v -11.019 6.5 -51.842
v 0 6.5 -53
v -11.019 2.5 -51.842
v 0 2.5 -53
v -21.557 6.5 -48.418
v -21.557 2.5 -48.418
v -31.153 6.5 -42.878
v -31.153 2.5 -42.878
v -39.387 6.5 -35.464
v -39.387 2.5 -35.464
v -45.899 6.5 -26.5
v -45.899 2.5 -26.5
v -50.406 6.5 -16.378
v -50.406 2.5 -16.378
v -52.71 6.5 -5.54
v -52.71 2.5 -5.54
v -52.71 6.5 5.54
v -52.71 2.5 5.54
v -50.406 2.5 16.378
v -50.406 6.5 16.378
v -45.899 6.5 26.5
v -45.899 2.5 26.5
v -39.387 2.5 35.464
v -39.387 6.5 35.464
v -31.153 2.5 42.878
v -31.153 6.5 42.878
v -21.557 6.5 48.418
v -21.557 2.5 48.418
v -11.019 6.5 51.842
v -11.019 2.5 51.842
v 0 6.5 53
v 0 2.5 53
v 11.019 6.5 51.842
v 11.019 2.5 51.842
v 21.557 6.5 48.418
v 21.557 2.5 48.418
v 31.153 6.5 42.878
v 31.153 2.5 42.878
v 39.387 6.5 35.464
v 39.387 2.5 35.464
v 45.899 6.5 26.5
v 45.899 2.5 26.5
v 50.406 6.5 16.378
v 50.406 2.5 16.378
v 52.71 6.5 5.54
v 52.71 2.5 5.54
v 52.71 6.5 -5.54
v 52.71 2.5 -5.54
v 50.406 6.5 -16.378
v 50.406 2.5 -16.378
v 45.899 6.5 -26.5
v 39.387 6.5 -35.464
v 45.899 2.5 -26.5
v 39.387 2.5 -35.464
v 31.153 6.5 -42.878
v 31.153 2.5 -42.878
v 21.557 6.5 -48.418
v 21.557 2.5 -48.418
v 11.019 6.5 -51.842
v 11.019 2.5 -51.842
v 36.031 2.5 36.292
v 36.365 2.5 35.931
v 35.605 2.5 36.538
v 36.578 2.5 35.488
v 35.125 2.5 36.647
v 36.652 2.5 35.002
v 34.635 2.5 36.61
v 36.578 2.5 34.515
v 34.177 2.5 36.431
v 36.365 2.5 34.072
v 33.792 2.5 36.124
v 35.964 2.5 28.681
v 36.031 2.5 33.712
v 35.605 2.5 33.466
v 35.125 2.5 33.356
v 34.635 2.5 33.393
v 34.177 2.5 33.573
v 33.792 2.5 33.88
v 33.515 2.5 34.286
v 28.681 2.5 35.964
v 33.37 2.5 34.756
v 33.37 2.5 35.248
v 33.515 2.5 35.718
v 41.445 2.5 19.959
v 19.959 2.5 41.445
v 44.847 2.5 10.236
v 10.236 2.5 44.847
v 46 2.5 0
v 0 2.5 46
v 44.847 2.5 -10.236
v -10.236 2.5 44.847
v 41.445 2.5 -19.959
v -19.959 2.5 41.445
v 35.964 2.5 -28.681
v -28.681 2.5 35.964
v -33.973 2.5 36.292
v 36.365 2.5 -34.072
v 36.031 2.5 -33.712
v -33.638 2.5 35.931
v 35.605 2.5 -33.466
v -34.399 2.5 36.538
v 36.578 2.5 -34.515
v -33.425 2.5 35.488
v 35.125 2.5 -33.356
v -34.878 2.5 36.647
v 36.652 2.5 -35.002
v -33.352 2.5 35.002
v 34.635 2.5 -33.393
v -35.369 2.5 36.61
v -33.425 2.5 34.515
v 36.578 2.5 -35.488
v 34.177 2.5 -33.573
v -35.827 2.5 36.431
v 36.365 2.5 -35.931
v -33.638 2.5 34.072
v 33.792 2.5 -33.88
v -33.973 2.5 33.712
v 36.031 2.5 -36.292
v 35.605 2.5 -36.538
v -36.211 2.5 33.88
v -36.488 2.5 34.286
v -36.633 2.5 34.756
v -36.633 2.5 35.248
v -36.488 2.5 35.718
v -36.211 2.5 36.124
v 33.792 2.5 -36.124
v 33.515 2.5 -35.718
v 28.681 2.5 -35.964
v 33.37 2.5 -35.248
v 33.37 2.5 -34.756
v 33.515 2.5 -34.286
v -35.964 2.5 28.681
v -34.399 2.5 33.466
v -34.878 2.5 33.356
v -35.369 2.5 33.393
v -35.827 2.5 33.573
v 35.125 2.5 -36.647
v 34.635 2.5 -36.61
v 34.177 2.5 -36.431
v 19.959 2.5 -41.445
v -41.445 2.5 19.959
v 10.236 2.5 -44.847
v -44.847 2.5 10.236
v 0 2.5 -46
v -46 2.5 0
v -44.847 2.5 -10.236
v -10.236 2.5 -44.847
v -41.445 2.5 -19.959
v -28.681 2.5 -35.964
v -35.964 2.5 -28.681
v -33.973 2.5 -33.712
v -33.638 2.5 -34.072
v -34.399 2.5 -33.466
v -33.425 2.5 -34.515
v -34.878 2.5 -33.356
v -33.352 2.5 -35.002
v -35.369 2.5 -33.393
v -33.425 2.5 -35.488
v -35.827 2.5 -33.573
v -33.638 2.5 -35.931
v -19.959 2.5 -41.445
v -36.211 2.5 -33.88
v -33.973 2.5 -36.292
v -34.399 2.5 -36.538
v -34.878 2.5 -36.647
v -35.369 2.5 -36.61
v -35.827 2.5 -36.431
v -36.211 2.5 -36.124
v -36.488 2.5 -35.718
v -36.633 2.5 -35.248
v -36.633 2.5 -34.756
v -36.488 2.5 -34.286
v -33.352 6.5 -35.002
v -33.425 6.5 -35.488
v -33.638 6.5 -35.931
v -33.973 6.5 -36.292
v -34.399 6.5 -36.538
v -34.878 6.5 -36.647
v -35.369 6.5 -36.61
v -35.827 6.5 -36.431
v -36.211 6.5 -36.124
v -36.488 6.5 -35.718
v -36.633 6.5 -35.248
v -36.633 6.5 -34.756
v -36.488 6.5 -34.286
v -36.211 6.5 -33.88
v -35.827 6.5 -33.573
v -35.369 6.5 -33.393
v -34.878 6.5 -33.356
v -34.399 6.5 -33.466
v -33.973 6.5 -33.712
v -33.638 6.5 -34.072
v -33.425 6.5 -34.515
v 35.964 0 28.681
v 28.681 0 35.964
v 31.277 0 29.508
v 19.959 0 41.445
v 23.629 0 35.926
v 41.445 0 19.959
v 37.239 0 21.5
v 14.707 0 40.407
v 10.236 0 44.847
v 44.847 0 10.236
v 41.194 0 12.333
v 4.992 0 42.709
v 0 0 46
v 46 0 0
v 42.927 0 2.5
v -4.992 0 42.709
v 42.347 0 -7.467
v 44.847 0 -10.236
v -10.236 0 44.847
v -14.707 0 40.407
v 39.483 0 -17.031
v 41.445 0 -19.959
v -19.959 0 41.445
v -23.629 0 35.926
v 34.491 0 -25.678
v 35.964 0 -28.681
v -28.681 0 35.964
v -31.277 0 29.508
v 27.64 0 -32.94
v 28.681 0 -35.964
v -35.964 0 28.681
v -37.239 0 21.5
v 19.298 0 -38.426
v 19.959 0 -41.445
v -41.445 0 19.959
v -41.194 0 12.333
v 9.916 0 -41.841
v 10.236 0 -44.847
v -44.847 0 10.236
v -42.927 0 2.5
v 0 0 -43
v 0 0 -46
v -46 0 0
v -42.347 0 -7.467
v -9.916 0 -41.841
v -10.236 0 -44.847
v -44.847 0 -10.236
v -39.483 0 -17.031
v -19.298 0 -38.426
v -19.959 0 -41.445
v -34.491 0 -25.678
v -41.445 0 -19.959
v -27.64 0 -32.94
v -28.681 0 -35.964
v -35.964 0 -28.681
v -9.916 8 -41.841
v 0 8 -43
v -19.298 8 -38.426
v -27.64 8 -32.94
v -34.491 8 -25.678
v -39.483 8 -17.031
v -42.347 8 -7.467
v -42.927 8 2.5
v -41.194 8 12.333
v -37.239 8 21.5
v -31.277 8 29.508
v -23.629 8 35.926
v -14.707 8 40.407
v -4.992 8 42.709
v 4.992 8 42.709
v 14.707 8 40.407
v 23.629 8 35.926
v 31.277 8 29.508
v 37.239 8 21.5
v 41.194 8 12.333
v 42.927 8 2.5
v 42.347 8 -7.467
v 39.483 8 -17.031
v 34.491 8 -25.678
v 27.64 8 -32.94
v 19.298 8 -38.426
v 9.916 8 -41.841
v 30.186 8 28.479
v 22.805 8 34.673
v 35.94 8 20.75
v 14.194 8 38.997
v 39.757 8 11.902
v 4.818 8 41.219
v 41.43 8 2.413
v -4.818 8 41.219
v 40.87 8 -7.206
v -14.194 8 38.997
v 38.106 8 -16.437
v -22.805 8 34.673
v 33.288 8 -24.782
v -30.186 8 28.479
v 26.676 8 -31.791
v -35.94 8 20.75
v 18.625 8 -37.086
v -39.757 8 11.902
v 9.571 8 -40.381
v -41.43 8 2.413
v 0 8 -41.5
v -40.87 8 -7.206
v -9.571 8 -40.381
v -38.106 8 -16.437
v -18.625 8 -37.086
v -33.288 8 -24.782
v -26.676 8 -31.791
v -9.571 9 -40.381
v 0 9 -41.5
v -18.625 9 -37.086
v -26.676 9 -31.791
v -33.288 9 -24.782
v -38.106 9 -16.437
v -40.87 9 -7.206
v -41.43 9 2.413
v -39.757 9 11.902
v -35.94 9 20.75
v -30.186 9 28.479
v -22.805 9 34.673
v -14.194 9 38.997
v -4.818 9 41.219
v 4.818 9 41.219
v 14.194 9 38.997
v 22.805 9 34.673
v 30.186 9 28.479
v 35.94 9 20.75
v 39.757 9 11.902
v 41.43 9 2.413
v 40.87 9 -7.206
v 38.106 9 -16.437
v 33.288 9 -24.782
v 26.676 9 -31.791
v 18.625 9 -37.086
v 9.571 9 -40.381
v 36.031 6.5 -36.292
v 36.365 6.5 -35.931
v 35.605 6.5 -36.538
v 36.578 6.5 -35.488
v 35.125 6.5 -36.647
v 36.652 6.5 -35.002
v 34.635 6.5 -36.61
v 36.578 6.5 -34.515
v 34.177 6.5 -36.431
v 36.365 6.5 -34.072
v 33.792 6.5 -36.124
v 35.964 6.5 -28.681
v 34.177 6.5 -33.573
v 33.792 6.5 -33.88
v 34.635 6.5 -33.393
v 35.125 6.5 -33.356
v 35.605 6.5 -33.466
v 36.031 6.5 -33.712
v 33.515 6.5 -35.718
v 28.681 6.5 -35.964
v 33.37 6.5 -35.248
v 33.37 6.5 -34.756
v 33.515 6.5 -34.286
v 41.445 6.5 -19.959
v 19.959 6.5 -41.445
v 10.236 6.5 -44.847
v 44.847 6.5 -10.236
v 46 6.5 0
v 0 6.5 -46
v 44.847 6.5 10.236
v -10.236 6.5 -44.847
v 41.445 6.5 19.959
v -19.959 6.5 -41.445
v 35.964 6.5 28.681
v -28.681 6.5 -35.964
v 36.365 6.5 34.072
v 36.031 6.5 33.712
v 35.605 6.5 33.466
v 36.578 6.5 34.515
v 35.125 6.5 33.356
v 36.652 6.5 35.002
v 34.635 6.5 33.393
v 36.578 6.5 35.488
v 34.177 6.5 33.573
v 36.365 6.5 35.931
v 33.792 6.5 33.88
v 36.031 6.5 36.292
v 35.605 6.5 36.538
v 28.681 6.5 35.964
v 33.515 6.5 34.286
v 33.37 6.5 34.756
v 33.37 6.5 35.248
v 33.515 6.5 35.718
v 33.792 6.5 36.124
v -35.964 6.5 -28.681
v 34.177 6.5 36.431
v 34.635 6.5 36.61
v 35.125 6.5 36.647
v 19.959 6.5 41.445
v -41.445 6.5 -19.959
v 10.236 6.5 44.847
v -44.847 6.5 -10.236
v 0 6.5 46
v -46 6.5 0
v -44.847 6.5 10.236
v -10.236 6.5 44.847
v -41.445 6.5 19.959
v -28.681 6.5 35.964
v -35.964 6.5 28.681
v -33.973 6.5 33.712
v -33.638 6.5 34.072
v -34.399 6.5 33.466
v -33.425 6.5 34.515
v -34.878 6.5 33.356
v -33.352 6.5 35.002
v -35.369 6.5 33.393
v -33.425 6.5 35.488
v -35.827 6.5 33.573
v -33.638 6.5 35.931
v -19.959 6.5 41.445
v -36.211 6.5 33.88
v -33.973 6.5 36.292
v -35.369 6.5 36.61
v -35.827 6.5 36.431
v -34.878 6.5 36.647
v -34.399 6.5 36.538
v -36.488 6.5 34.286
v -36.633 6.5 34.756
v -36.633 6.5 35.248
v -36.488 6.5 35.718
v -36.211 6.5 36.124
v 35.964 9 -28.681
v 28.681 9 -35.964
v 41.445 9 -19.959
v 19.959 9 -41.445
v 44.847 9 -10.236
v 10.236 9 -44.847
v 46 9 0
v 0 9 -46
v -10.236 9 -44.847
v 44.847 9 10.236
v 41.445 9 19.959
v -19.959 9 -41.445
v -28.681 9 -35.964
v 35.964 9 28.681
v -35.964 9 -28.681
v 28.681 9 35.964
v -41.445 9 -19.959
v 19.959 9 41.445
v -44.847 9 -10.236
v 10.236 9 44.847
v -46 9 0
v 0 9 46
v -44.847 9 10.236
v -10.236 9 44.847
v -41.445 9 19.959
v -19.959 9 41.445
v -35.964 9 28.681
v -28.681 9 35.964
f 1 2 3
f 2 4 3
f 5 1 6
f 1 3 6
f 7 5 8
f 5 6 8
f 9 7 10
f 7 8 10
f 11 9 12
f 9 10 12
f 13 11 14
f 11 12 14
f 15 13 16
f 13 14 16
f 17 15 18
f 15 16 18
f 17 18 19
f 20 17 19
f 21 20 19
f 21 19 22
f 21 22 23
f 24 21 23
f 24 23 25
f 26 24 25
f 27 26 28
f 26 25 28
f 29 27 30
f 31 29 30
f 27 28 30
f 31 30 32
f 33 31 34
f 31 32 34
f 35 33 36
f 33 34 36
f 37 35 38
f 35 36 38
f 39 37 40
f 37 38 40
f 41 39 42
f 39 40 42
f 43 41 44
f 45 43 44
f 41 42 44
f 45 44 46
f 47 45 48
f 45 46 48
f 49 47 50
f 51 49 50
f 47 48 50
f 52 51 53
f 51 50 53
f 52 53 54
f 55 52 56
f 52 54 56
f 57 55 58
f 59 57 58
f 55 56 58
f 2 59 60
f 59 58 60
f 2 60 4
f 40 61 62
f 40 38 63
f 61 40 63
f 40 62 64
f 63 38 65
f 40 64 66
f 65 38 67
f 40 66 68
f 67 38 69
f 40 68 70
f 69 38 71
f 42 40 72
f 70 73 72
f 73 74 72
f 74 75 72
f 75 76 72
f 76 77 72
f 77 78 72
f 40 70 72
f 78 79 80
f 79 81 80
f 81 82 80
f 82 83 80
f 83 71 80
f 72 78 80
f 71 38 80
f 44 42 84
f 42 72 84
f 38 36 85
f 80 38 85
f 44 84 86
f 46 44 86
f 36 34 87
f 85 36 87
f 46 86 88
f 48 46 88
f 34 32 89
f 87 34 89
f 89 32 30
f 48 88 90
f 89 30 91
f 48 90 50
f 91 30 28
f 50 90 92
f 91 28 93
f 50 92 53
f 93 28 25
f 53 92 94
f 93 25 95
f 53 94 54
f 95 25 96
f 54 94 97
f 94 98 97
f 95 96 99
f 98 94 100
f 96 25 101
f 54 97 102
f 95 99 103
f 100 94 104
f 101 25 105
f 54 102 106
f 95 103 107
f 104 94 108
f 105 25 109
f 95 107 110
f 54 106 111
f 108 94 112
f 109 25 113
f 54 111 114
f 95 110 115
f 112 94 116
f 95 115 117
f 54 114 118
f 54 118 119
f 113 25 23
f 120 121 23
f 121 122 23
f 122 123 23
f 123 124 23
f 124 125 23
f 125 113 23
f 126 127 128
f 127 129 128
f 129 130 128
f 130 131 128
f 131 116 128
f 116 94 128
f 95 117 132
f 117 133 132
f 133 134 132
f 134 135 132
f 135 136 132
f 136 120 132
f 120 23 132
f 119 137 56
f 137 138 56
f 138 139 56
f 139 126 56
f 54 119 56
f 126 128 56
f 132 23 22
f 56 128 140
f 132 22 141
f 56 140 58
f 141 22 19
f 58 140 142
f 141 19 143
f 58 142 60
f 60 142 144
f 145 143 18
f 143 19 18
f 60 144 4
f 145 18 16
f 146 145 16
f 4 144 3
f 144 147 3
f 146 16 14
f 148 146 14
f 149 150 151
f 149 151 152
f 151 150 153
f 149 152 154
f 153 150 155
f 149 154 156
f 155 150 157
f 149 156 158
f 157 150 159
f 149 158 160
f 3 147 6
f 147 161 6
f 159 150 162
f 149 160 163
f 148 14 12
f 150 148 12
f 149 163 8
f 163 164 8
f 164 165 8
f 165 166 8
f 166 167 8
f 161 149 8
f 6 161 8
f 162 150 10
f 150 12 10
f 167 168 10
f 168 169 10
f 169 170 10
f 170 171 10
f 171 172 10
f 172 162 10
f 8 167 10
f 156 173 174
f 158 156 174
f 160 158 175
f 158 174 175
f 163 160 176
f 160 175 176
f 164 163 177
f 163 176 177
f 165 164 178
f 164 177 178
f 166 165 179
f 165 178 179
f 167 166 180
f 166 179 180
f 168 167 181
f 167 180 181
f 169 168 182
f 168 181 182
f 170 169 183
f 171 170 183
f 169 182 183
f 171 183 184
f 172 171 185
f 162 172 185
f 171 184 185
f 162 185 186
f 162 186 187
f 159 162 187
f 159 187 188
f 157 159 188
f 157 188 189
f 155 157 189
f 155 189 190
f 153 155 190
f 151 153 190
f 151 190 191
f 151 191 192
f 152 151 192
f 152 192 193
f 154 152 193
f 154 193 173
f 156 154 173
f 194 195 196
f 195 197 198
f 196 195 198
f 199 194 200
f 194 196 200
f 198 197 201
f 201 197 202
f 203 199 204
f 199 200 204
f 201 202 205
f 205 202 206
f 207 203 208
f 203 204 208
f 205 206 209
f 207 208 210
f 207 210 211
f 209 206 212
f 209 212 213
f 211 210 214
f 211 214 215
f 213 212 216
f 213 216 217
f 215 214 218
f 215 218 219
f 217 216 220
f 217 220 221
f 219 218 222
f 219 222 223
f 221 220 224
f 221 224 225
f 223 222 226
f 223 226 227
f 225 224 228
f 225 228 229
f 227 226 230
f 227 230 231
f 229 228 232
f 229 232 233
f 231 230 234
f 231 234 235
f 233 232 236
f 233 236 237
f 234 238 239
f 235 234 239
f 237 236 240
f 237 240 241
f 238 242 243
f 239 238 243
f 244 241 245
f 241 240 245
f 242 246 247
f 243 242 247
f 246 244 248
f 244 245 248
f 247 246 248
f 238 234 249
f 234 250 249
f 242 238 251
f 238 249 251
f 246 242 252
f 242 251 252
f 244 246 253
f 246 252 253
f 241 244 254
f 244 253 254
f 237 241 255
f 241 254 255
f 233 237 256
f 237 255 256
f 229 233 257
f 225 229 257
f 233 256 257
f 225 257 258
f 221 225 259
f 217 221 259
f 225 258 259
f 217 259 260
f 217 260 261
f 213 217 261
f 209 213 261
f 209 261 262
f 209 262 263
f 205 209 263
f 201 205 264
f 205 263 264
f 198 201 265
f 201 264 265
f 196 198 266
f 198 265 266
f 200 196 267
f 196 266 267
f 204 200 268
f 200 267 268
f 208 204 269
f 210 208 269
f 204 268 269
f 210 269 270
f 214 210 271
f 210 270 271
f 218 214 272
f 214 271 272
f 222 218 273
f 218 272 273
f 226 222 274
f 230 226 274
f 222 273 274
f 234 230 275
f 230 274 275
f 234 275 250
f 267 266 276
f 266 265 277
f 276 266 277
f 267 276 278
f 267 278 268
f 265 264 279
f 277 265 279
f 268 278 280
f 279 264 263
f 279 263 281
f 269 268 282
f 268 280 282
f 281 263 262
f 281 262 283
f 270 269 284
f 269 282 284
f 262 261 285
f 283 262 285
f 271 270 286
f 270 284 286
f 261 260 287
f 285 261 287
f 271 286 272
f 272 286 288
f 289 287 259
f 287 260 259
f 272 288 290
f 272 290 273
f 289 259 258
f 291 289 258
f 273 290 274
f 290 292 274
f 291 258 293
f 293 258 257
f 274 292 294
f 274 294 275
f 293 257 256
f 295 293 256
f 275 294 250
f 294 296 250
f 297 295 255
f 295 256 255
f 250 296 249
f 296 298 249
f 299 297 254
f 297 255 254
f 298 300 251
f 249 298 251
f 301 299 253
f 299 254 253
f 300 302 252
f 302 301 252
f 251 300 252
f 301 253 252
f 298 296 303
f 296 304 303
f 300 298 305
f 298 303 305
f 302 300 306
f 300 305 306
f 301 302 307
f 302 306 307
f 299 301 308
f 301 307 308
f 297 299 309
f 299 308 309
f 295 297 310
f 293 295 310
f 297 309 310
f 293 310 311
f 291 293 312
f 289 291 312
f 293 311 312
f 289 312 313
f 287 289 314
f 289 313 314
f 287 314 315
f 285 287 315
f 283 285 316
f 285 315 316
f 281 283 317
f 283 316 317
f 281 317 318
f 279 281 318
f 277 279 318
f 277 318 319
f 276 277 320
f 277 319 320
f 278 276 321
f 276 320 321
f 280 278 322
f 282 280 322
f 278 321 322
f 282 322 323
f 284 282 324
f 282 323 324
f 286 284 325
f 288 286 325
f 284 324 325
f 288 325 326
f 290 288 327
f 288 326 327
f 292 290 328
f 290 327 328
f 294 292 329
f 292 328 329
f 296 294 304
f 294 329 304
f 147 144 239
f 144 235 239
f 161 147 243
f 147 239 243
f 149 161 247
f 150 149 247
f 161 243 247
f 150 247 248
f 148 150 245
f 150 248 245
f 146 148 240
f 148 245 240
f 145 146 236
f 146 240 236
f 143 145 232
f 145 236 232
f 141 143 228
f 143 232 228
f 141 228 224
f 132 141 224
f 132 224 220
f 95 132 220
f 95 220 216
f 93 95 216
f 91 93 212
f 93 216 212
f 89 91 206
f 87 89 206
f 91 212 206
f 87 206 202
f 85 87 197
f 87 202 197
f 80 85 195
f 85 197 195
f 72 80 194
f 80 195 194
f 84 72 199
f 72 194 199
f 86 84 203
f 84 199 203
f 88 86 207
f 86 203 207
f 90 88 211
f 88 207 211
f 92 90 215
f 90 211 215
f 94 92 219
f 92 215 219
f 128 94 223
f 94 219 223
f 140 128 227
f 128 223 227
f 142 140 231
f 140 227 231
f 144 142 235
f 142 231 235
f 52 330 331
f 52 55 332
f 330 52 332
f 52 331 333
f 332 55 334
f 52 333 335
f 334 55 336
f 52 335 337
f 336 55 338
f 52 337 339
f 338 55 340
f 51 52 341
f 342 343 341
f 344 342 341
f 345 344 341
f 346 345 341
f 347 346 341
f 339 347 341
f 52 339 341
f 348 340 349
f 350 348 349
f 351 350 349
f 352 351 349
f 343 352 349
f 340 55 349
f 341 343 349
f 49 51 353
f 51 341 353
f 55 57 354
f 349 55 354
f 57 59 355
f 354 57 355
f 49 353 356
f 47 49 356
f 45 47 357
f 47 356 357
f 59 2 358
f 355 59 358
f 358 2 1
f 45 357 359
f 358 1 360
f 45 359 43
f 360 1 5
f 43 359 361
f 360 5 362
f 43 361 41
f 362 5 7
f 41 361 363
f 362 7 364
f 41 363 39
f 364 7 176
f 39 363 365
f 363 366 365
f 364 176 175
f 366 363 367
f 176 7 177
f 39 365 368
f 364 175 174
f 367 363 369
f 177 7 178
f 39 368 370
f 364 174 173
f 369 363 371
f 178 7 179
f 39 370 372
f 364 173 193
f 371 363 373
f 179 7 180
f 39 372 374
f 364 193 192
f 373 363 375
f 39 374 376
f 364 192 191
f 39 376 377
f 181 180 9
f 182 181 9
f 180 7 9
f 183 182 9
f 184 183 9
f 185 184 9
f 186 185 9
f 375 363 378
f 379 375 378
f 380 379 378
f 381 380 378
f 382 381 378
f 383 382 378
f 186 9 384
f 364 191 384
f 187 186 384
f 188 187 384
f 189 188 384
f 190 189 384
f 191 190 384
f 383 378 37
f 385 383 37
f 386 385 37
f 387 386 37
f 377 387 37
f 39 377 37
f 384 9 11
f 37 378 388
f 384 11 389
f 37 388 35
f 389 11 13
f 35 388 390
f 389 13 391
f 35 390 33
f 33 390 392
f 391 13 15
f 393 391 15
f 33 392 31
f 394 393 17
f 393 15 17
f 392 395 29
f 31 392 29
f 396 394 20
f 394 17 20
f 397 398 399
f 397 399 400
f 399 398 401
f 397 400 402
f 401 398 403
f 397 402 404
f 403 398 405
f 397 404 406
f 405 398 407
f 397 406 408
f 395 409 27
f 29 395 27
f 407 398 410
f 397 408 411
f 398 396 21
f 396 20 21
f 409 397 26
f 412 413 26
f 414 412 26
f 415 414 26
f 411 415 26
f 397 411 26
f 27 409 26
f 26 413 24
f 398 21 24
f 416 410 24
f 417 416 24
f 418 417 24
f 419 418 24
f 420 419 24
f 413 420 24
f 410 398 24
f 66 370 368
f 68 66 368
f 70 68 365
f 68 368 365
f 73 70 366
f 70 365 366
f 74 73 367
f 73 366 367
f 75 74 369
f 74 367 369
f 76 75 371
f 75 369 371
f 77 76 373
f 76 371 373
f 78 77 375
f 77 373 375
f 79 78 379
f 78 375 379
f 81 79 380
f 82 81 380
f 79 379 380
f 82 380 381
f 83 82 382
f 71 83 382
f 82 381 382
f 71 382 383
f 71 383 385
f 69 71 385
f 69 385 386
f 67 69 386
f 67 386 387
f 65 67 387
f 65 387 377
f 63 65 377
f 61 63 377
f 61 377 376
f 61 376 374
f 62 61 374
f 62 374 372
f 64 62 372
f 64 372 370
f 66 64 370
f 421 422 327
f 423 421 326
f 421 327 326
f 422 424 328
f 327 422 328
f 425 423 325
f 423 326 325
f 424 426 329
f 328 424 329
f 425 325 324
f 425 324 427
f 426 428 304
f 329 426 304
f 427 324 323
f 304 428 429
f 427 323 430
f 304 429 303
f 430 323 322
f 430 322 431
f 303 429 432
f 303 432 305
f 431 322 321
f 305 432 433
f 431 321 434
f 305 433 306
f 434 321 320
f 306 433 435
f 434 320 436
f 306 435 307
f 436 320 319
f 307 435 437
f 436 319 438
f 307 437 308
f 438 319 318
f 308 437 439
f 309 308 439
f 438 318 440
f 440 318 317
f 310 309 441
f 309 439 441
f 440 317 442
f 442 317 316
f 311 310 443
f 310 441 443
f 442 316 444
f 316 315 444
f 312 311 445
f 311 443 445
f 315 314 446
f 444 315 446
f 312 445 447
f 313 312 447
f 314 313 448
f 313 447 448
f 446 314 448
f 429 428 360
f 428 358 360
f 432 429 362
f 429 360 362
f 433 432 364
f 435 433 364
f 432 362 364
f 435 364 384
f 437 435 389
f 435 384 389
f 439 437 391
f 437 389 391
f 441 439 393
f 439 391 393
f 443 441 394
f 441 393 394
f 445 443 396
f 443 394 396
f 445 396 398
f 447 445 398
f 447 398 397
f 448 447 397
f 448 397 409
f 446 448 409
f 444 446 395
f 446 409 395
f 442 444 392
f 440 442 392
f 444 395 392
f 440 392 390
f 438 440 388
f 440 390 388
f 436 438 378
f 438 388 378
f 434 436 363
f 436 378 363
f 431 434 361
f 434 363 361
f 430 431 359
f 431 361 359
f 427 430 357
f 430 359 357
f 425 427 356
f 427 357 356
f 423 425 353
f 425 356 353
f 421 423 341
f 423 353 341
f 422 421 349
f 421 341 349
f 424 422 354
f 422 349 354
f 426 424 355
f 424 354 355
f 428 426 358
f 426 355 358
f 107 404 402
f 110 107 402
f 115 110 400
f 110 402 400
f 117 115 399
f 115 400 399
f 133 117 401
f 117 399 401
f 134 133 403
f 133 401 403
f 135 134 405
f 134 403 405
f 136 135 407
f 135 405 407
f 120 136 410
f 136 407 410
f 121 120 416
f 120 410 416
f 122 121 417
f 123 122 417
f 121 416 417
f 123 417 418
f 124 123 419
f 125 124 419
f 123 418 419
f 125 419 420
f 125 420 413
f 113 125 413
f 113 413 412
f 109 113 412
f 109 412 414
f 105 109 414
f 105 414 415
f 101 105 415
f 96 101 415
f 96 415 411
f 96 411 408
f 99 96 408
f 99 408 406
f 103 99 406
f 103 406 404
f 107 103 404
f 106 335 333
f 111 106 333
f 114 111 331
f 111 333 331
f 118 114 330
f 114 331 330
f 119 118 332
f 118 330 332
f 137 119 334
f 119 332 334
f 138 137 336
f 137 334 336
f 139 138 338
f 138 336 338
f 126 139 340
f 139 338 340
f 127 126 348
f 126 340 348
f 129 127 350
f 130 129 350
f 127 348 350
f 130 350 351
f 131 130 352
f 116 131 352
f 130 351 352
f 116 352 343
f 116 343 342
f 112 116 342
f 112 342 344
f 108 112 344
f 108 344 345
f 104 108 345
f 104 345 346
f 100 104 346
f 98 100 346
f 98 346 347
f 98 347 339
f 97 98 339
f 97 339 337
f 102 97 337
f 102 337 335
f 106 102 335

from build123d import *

# Parameters (mm, degrees)
HOLE_WIZARD_M4_1_D = 3.3


with BuildPart() as part:
    # 草图1 → 旋转1 (revolve)
    with BuildSketch(Plane.XY, mode=Mode.PRIVATE) as revolve_1_sk:
        Polygon((41.5, 9), (46, 9), (46, 6.5), (53, 6.5), (53, 2.5), (46, 2.5), (46, 0), (43, 0), (43, 8), (41.5, 8), align=None)
    revolve(revolve_1_sk.sketch.rotate(Axis((0, 0, 0), (0, 1, 0)), 90), axis=Axis((0, 0, 0), (0, 1, 0)))

    # M4 螺纹孔1 (through all)
    with Locations(Plane(origin=(0, 2.5, 0), x_dir=(-1, 0, 0), z_dir=(0, -1, 0))):
        with Locations((-35.001785669, 35.001785669), (35.001785669, 35.001785669), (35.001785669, -35.001785669), (-35.001785669, -35.001785669)):
            Hole(HOLE_WIZARD_M4_1_D / 2)


solid = part.part
